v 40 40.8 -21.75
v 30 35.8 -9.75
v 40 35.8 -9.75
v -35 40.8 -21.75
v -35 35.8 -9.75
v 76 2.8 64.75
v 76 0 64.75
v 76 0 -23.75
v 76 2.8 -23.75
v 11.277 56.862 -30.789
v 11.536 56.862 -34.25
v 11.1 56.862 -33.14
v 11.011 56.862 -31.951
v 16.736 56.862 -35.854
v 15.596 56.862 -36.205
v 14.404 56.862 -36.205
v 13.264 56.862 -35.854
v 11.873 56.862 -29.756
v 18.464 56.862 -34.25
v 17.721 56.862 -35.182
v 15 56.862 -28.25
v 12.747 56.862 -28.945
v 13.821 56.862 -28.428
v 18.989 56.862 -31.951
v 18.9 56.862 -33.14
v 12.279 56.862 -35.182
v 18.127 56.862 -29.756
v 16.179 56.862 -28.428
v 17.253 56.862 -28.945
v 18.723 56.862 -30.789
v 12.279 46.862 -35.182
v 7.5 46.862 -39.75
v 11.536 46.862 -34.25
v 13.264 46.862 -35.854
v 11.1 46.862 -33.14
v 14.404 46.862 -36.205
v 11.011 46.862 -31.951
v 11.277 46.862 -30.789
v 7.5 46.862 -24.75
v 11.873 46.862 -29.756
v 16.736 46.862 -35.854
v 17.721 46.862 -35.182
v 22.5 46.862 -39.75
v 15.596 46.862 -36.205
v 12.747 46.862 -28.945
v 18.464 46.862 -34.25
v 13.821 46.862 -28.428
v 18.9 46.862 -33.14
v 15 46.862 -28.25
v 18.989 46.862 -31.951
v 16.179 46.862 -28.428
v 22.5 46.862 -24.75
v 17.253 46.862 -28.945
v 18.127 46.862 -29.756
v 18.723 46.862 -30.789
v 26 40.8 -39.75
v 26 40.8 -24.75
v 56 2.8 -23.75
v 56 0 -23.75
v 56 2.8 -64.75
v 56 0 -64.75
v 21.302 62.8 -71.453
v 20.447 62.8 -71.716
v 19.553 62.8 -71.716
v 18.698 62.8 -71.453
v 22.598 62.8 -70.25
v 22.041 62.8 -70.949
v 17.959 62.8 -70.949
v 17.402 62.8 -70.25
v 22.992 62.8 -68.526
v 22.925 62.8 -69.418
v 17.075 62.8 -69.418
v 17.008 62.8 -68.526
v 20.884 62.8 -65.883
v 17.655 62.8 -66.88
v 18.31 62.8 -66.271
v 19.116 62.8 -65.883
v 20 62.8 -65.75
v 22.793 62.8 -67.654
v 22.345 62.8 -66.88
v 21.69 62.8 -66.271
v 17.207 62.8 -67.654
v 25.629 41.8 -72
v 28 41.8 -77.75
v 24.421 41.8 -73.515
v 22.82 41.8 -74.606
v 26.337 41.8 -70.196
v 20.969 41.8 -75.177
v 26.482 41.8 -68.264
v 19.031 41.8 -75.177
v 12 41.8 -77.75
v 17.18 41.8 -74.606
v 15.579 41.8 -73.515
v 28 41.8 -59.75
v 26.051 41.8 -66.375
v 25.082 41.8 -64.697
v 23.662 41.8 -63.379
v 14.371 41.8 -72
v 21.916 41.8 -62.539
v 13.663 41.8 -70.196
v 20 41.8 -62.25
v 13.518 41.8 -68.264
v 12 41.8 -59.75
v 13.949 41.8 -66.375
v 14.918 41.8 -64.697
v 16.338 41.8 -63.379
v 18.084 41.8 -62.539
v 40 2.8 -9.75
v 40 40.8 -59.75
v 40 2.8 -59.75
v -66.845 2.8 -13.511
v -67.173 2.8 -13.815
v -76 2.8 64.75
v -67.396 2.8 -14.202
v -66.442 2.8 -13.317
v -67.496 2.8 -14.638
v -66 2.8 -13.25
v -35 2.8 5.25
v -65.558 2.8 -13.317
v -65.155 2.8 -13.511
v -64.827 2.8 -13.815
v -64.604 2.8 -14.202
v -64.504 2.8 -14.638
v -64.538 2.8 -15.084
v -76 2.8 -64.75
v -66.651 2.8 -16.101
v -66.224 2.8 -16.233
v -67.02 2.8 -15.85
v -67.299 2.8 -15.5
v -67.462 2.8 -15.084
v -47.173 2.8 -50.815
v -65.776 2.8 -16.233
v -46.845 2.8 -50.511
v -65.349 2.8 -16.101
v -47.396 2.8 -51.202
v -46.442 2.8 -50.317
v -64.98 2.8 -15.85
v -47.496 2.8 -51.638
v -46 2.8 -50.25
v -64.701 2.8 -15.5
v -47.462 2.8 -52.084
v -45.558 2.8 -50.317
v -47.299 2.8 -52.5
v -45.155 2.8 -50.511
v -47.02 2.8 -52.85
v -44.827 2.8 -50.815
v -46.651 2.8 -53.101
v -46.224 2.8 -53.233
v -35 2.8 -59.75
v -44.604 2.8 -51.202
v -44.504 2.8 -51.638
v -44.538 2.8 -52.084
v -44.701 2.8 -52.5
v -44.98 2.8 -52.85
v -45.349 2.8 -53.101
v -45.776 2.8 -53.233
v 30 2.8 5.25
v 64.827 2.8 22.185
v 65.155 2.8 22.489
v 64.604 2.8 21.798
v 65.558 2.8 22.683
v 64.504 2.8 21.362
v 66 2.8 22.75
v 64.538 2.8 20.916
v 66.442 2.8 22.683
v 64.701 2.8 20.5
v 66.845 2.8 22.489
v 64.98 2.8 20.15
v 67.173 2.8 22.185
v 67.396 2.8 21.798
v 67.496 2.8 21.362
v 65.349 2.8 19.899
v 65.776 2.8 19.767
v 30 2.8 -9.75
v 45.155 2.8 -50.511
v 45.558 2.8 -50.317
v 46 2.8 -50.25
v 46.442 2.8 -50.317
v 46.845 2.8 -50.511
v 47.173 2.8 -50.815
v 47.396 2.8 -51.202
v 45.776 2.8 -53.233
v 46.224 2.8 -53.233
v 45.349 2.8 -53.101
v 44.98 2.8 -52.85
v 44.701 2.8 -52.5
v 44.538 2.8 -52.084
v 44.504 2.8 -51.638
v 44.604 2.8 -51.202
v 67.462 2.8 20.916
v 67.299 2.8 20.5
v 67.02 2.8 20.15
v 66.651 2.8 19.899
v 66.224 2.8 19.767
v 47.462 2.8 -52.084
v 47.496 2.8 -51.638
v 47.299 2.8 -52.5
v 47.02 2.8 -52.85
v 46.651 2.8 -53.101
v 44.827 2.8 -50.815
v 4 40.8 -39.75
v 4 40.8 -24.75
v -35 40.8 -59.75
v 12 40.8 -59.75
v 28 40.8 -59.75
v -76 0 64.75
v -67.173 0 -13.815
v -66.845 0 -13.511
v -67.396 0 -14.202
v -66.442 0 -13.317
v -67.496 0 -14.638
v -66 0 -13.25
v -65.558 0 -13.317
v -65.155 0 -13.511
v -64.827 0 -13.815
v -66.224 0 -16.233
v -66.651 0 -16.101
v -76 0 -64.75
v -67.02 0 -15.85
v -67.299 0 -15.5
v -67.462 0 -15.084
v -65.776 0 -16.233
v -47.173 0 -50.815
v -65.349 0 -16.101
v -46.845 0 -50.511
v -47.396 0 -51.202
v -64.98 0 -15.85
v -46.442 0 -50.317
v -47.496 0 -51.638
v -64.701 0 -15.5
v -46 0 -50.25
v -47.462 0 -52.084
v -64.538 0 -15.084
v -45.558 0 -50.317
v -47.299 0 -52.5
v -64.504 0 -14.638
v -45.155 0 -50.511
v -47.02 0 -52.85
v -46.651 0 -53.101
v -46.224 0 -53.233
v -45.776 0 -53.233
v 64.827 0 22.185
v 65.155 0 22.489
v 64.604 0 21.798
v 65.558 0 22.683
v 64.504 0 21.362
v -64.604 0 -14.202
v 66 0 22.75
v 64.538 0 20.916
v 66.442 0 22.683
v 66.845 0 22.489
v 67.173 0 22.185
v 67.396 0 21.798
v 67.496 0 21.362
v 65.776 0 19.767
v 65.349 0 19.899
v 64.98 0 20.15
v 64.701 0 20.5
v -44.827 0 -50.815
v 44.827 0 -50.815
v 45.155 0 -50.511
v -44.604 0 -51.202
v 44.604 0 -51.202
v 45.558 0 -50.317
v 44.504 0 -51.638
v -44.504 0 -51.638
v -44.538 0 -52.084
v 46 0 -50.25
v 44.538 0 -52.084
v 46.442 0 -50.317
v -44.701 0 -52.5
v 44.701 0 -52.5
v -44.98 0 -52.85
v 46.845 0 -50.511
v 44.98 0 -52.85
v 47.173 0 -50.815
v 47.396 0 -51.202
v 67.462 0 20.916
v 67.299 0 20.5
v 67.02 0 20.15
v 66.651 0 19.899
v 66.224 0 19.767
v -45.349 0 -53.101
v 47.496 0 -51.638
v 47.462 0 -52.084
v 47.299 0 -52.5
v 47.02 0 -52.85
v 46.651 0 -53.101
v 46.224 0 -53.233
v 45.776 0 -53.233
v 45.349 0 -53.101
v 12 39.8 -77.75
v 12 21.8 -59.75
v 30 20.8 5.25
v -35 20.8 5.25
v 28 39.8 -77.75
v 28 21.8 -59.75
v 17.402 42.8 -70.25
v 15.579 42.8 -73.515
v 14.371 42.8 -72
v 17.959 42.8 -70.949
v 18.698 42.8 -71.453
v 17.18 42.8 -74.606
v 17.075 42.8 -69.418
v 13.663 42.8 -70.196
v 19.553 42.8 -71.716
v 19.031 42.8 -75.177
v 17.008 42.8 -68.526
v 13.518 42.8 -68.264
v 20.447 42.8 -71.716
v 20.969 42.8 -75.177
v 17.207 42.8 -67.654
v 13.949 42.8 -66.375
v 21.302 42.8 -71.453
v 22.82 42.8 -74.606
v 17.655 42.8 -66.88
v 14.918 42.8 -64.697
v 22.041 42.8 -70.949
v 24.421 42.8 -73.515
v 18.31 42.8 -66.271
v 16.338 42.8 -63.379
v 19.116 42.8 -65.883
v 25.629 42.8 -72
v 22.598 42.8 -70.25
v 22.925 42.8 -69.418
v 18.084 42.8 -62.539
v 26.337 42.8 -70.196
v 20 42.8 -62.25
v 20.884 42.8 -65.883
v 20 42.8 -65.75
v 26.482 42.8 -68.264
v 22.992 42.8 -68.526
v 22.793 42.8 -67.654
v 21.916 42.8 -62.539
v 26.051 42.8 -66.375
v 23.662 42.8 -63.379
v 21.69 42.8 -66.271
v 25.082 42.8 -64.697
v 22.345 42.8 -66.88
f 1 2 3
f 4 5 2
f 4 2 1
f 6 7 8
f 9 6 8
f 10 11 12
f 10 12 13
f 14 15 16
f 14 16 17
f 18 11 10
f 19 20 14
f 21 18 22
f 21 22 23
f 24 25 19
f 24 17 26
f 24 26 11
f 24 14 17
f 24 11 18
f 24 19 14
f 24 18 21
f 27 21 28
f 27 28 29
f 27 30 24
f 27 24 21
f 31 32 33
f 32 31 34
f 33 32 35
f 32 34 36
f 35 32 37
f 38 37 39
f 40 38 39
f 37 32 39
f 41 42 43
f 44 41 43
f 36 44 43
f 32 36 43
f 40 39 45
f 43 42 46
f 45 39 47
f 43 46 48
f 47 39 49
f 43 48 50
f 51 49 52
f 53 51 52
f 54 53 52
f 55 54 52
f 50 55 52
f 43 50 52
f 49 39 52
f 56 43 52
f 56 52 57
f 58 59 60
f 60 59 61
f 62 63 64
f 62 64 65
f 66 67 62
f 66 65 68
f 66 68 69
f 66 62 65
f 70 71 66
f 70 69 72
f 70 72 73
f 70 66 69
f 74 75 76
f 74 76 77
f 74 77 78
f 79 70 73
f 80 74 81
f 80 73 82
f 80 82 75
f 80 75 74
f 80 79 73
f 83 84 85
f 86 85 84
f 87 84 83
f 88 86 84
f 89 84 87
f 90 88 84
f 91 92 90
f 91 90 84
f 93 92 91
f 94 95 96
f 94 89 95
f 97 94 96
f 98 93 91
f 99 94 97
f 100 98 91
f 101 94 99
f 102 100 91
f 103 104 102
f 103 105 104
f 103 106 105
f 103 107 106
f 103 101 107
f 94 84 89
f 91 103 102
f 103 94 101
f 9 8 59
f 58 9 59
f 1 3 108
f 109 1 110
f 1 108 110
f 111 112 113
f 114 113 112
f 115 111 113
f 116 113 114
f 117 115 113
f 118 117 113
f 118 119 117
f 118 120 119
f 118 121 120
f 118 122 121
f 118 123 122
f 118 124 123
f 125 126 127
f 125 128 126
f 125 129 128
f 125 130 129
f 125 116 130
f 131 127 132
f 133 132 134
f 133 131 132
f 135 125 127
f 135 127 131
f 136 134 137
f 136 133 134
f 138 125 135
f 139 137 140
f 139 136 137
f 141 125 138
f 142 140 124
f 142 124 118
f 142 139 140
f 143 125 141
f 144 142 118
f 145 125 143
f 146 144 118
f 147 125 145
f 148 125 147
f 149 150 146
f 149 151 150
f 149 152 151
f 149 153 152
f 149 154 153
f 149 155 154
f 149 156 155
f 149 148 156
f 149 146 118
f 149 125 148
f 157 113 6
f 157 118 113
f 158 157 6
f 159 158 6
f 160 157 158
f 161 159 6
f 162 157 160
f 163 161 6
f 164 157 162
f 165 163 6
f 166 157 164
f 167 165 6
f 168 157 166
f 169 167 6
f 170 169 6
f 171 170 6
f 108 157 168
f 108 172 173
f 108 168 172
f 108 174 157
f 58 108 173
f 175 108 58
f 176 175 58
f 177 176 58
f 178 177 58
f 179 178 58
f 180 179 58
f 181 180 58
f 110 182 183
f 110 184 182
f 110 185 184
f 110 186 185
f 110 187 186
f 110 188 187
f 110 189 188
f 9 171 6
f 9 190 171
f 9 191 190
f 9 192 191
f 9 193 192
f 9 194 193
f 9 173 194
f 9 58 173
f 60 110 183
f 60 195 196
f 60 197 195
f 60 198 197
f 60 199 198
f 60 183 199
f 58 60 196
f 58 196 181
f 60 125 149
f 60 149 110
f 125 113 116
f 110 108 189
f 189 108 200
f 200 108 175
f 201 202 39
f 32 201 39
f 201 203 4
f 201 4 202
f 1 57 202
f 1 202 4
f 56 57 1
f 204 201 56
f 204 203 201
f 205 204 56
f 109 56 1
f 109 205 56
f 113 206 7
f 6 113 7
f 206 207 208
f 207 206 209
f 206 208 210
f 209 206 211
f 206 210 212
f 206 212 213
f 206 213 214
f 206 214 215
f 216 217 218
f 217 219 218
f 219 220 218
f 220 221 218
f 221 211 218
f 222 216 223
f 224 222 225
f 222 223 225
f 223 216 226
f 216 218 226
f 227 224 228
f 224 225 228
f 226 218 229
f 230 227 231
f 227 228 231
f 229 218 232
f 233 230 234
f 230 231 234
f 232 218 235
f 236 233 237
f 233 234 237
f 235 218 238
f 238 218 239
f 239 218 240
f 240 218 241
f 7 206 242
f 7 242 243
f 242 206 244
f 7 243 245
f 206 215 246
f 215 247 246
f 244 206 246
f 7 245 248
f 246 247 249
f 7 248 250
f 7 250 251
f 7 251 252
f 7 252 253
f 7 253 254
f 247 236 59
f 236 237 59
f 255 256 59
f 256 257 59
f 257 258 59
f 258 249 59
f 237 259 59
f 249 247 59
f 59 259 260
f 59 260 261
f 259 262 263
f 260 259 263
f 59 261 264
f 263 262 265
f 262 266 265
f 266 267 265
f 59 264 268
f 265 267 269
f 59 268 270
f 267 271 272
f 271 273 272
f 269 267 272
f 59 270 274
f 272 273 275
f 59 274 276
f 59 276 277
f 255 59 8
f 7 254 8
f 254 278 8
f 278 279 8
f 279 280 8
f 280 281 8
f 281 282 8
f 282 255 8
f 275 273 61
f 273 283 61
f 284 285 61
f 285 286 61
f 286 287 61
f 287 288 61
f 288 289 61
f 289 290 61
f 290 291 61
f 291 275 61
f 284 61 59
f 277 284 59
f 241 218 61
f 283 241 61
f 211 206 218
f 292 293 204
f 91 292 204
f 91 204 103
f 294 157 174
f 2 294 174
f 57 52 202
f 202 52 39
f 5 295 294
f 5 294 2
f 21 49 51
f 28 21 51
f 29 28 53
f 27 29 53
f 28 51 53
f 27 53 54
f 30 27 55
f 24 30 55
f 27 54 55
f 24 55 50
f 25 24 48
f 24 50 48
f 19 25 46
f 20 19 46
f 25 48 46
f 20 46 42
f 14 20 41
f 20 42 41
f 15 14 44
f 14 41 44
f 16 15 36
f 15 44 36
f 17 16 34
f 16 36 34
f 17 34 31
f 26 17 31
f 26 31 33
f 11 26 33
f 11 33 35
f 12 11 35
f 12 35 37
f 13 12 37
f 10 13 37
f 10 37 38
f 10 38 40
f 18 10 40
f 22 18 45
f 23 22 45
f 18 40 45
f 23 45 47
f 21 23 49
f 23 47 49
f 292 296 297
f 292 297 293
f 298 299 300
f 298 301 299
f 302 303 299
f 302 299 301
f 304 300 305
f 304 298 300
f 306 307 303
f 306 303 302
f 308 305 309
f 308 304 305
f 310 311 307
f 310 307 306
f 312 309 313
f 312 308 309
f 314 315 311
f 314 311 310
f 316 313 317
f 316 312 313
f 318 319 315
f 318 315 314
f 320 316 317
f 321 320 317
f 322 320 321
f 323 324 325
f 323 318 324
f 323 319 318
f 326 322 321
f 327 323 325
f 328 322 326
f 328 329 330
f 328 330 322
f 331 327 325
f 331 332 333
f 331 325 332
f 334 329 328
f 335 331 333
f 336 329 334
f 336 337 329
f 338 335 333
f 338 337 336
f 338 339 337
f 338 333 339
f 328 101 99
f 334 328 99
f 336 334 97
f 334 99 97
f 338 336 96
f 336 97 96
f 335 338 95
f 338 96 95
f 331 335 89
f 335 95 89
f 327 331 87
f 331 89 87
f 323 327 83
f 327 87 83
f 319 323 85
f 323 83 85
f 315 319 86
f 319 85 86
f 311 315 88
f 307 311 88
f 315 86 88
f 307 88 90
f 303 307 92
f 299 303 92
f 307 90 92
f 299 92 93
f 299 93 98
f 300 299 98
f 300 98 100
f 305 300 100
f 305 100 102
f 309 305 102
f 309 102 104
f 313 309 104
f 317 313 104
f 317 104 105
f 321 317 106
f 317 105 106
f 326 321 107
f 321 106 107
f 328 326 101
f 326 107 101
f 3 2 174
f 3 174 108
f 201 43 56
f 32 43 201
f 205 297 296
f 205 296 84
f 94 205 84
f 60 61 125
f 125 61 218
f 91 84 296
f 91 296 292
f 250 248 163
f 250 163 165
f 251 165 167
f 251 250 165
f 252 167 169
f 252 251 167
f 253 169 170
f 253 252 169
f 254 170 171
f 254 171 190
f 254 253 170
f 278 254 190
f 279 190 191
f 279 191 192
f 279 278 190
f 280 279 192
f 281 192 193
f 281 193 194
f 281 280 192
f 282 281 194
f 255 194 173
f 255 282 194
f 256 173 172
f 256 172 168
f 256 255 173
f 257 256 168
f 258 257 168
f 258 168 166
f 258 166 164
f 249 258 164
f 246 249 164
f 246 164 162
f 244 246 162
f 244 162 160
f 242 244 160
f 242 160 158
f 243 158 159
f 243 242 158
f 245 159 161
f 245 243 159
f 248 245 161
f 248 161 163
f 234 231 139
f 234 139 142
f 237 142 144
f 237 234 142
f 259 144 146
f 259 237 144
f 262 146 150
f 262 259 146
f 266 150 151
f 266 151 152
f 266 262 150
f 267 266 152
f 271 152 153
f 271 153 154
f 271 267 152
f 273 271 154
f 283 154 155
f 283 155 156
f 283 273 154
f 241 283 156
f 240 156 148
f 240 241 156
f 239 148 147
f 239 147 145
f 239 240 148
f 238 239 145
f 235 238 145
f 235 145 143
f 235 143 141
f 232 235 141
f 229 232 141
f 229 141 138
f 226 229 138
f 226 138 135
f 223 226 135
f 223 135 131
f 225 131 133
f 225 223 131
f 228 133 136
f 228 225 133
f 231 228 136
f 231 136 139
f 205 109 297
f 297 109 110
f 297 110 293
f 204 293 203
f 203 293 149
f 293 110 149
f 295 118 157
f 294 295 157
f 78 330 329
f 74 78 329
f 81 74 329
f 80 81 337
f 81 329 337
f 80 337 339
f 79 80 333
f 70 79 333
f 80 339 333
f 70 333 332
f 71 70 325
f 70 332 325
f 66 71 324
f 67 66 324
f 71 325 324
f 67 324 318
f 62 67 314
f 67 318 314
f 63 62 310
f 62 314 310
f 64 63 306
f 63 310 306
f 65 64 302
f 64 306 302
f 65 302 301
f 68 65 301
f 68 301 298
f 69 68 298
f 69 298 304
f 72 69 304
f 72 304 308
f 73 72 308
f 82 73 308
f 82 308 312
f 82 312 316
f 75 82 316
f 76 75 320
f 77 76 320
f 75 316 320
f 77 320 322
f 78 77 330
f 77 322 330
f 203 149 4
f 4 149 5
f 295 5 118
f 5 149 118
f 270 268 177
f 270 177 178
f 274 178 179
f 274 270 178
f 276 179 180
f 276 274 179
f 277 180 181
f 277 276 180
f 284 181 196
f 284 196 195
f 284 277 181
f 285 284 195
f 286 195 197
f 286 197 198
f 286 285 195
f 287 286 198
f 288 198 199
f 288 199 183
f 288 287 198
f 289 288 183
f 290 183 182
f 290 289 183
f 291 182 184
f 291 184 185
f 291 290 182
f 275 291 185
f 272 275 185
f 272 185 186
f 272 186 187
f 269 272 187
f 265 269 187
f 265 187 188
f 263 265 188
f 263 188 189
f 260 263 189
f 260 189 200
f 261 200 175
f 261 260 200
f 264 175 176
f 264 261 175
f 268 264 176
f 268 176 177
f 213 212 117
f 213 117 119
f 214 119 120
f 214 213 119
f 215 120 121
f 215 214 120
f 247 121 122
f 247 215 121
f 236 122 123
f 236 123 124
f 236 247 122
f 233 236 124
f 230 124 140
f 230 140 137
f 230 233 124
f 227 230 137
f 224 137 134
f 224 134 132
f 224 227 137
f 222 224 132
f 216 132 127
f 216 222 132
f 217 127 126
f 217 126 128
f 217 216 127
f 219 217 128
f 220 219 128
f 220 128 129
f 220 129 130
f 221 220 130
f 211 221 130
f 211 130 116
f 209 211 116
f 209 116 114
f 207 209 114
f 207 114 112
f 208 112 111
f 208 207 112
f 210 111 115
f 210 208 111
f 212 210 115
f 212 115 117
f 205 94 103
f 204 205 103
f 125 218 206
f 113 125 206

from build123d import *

# Parameters (mm, degrees)
SKETCH1_R           = 1.5
BOSS_EXTRUDE1_DEPTH = 2.8
BOSS_EXTRUDE2_DEPTH = 38
CUT_EXTRUDE1_REACH  = 136.827
SKETCH4_W           = 16
SKETCH4_H           = 20
BOSS_EXTRUDE3_DEPTH = 18
CHAMFER1_SIZE       = 18
SKETCH5_R           = 6.5
BOSS_EXTRUDE4_DEPTH = 1
SKETCH6_R           = 3
BOSS_EXTRUDE5_DEPTH = 20
BOSS_EXTRUDE6_DEPTH = 15
SKETCH8_R           = 4
BOSS_EXTRUDE7_DEPTH = 10


with BuildPart() as part:
    # Sketch1 → Boss-Extrude1 (new body)
    with BuildSketch(Plane(origin=(0, 0, 0), x_dir=(1, 0, 0), z_dir=(0, 1, 0))):
        Polygon((56, 23.75), (56, 64.75), (-76, 64.75), (-76, -64.75), (76, -64.75), (76, 23.75), align=None)
        with Locations(Location((66, -21.25, 0), (0, 0, 270))):
            Circle(SKETCH1_R, mode=Mode.SUBTRACT)
        with Locations(Location((-66, 14.75, 0), (0, 0, 270))):
            Circle(SKETCH1_R, mode=Mode.SUBTRACT)
        with Locations(Location((-46, 51.75, 0), (0, 0, 270))):
            Circle(SKETCH1_R, mode=Mode.SUBTRACT)
        with Locations(Location((46, 51.75, 0), (0, 0, 270))):
            Circle(SKETCH1_R, mode=Mode.SUBTRACT)
    extrude(amount=BOSS_EXTRUDE1_DEPTH)

    # Sketch2 → Boss-Extrude2 (add)
    with BuildSketch(Plane(origin=(0, 2.8, 0), x_dir=(1, 0, 0), z_dir=(0, 1, 0))):
        Polygon((-35, 59.75), (-35, -5.25), (30, -5.25), (30, 9.75), (40, 9.75), (40, 59.75), align=None)
    extrude(amount=BOSS_EXTRUDE2_DEPTH)

    # Sketch3 → Cut-Extrude1 (cut, up to next)
    with BuildSketch(Plane.ZY.offset(35), mode=Mode.PRIVATE) as cut_extrude1_sk1:
        Polygon((5.25, 20.8), (-9.75, 35.8), (-21.75, 40.8), (5.25, 40.8), align=None)
    cut_extrude1_tool1 = extrude(cut_extrude1_sk1.sketch, amount=-CUT_EXTRUDE1_REACH, mode=Mode.PRIVATE) & part.part
    add(cut_extrude1_tool1.solids().sort_by_distance((-35, 34.535632, -2.543103))[0], mode=Mode.SUBTRACT)

    # Sketch4 → Boss-Extrude3 (add)
    with BuildSketch(Plane(origin=(0, 0, -59.75), x_dir=(-1, 0, 0), z_dir=(0, 0, -1))):
        with Locations((-20, 31.8)):
            Rectangle(SKETCH4_W, SKETCH4_H)
    extrude(amount=BOSS_EXTRUDE3_DEPTH)

    # Chamfer1
    chamfer1_edges = [part.edges().sort_by_distance(p)[0] for p in [
        (20, 21.8, -77.75),
    ]]
    chamfer(chamfer1_edges, length=CHAMFER1_SIZE - 0.0001)  # a hair under: the kernel refuses the full size

    # Sketch5 → Boss-Extrude4 (add)
    with BuildSketch(Plane(origin=(0, 41.8, 0), x_dir=(1, 0, 0), z_dir=(0, 1, 0))):
        with Locations(Location((20, 68.75, 0), (0, 0, 270))):
            Circle(SKETCH5_R)
    extrude(amount=BOSS_EXTRUDE4_DEPTH)

    # Sketch6 → Boss-Extrude5 (add)
    with BuildSketch(Plane(origin=(0, 42.8, 0), x_dir=(1, 0, 0), z_dir=(0, 1, 0))):
        with Locations(Location((20, 68.75, 0), (0, 0, 270))):
            Circle(SKETCH6_R)
    extrude(amount=BOSS_EXTRUDE5_DEPTH)

    # Sketch7 → Boss-Extrude6 (add)
    with BuildSketch(Plane.XY.offset(-24.75)):
        Polygon((26, 40.8), (4, 40.8), (7.5, 46.862177826), (22.5, 46.862177826), align=None)
    extrude(amount=-BOSS_EXTRUDE6_DEPTH)

    # Sketch8 → Boss-Extrude7 (add)
    with BuildSketch(Plane(origin=(0, 46.862177826, 0), x_dir=(1, 0, 0), z_dir=(0, 1, 0))):
        with Locations(Location((15, 32.25, 0), (0, 0, 270))):
            Circle(SKETCH8_R)
    extrude(amount=BOSS_EXTRUDE7_DEPTH)


solid = part.part
